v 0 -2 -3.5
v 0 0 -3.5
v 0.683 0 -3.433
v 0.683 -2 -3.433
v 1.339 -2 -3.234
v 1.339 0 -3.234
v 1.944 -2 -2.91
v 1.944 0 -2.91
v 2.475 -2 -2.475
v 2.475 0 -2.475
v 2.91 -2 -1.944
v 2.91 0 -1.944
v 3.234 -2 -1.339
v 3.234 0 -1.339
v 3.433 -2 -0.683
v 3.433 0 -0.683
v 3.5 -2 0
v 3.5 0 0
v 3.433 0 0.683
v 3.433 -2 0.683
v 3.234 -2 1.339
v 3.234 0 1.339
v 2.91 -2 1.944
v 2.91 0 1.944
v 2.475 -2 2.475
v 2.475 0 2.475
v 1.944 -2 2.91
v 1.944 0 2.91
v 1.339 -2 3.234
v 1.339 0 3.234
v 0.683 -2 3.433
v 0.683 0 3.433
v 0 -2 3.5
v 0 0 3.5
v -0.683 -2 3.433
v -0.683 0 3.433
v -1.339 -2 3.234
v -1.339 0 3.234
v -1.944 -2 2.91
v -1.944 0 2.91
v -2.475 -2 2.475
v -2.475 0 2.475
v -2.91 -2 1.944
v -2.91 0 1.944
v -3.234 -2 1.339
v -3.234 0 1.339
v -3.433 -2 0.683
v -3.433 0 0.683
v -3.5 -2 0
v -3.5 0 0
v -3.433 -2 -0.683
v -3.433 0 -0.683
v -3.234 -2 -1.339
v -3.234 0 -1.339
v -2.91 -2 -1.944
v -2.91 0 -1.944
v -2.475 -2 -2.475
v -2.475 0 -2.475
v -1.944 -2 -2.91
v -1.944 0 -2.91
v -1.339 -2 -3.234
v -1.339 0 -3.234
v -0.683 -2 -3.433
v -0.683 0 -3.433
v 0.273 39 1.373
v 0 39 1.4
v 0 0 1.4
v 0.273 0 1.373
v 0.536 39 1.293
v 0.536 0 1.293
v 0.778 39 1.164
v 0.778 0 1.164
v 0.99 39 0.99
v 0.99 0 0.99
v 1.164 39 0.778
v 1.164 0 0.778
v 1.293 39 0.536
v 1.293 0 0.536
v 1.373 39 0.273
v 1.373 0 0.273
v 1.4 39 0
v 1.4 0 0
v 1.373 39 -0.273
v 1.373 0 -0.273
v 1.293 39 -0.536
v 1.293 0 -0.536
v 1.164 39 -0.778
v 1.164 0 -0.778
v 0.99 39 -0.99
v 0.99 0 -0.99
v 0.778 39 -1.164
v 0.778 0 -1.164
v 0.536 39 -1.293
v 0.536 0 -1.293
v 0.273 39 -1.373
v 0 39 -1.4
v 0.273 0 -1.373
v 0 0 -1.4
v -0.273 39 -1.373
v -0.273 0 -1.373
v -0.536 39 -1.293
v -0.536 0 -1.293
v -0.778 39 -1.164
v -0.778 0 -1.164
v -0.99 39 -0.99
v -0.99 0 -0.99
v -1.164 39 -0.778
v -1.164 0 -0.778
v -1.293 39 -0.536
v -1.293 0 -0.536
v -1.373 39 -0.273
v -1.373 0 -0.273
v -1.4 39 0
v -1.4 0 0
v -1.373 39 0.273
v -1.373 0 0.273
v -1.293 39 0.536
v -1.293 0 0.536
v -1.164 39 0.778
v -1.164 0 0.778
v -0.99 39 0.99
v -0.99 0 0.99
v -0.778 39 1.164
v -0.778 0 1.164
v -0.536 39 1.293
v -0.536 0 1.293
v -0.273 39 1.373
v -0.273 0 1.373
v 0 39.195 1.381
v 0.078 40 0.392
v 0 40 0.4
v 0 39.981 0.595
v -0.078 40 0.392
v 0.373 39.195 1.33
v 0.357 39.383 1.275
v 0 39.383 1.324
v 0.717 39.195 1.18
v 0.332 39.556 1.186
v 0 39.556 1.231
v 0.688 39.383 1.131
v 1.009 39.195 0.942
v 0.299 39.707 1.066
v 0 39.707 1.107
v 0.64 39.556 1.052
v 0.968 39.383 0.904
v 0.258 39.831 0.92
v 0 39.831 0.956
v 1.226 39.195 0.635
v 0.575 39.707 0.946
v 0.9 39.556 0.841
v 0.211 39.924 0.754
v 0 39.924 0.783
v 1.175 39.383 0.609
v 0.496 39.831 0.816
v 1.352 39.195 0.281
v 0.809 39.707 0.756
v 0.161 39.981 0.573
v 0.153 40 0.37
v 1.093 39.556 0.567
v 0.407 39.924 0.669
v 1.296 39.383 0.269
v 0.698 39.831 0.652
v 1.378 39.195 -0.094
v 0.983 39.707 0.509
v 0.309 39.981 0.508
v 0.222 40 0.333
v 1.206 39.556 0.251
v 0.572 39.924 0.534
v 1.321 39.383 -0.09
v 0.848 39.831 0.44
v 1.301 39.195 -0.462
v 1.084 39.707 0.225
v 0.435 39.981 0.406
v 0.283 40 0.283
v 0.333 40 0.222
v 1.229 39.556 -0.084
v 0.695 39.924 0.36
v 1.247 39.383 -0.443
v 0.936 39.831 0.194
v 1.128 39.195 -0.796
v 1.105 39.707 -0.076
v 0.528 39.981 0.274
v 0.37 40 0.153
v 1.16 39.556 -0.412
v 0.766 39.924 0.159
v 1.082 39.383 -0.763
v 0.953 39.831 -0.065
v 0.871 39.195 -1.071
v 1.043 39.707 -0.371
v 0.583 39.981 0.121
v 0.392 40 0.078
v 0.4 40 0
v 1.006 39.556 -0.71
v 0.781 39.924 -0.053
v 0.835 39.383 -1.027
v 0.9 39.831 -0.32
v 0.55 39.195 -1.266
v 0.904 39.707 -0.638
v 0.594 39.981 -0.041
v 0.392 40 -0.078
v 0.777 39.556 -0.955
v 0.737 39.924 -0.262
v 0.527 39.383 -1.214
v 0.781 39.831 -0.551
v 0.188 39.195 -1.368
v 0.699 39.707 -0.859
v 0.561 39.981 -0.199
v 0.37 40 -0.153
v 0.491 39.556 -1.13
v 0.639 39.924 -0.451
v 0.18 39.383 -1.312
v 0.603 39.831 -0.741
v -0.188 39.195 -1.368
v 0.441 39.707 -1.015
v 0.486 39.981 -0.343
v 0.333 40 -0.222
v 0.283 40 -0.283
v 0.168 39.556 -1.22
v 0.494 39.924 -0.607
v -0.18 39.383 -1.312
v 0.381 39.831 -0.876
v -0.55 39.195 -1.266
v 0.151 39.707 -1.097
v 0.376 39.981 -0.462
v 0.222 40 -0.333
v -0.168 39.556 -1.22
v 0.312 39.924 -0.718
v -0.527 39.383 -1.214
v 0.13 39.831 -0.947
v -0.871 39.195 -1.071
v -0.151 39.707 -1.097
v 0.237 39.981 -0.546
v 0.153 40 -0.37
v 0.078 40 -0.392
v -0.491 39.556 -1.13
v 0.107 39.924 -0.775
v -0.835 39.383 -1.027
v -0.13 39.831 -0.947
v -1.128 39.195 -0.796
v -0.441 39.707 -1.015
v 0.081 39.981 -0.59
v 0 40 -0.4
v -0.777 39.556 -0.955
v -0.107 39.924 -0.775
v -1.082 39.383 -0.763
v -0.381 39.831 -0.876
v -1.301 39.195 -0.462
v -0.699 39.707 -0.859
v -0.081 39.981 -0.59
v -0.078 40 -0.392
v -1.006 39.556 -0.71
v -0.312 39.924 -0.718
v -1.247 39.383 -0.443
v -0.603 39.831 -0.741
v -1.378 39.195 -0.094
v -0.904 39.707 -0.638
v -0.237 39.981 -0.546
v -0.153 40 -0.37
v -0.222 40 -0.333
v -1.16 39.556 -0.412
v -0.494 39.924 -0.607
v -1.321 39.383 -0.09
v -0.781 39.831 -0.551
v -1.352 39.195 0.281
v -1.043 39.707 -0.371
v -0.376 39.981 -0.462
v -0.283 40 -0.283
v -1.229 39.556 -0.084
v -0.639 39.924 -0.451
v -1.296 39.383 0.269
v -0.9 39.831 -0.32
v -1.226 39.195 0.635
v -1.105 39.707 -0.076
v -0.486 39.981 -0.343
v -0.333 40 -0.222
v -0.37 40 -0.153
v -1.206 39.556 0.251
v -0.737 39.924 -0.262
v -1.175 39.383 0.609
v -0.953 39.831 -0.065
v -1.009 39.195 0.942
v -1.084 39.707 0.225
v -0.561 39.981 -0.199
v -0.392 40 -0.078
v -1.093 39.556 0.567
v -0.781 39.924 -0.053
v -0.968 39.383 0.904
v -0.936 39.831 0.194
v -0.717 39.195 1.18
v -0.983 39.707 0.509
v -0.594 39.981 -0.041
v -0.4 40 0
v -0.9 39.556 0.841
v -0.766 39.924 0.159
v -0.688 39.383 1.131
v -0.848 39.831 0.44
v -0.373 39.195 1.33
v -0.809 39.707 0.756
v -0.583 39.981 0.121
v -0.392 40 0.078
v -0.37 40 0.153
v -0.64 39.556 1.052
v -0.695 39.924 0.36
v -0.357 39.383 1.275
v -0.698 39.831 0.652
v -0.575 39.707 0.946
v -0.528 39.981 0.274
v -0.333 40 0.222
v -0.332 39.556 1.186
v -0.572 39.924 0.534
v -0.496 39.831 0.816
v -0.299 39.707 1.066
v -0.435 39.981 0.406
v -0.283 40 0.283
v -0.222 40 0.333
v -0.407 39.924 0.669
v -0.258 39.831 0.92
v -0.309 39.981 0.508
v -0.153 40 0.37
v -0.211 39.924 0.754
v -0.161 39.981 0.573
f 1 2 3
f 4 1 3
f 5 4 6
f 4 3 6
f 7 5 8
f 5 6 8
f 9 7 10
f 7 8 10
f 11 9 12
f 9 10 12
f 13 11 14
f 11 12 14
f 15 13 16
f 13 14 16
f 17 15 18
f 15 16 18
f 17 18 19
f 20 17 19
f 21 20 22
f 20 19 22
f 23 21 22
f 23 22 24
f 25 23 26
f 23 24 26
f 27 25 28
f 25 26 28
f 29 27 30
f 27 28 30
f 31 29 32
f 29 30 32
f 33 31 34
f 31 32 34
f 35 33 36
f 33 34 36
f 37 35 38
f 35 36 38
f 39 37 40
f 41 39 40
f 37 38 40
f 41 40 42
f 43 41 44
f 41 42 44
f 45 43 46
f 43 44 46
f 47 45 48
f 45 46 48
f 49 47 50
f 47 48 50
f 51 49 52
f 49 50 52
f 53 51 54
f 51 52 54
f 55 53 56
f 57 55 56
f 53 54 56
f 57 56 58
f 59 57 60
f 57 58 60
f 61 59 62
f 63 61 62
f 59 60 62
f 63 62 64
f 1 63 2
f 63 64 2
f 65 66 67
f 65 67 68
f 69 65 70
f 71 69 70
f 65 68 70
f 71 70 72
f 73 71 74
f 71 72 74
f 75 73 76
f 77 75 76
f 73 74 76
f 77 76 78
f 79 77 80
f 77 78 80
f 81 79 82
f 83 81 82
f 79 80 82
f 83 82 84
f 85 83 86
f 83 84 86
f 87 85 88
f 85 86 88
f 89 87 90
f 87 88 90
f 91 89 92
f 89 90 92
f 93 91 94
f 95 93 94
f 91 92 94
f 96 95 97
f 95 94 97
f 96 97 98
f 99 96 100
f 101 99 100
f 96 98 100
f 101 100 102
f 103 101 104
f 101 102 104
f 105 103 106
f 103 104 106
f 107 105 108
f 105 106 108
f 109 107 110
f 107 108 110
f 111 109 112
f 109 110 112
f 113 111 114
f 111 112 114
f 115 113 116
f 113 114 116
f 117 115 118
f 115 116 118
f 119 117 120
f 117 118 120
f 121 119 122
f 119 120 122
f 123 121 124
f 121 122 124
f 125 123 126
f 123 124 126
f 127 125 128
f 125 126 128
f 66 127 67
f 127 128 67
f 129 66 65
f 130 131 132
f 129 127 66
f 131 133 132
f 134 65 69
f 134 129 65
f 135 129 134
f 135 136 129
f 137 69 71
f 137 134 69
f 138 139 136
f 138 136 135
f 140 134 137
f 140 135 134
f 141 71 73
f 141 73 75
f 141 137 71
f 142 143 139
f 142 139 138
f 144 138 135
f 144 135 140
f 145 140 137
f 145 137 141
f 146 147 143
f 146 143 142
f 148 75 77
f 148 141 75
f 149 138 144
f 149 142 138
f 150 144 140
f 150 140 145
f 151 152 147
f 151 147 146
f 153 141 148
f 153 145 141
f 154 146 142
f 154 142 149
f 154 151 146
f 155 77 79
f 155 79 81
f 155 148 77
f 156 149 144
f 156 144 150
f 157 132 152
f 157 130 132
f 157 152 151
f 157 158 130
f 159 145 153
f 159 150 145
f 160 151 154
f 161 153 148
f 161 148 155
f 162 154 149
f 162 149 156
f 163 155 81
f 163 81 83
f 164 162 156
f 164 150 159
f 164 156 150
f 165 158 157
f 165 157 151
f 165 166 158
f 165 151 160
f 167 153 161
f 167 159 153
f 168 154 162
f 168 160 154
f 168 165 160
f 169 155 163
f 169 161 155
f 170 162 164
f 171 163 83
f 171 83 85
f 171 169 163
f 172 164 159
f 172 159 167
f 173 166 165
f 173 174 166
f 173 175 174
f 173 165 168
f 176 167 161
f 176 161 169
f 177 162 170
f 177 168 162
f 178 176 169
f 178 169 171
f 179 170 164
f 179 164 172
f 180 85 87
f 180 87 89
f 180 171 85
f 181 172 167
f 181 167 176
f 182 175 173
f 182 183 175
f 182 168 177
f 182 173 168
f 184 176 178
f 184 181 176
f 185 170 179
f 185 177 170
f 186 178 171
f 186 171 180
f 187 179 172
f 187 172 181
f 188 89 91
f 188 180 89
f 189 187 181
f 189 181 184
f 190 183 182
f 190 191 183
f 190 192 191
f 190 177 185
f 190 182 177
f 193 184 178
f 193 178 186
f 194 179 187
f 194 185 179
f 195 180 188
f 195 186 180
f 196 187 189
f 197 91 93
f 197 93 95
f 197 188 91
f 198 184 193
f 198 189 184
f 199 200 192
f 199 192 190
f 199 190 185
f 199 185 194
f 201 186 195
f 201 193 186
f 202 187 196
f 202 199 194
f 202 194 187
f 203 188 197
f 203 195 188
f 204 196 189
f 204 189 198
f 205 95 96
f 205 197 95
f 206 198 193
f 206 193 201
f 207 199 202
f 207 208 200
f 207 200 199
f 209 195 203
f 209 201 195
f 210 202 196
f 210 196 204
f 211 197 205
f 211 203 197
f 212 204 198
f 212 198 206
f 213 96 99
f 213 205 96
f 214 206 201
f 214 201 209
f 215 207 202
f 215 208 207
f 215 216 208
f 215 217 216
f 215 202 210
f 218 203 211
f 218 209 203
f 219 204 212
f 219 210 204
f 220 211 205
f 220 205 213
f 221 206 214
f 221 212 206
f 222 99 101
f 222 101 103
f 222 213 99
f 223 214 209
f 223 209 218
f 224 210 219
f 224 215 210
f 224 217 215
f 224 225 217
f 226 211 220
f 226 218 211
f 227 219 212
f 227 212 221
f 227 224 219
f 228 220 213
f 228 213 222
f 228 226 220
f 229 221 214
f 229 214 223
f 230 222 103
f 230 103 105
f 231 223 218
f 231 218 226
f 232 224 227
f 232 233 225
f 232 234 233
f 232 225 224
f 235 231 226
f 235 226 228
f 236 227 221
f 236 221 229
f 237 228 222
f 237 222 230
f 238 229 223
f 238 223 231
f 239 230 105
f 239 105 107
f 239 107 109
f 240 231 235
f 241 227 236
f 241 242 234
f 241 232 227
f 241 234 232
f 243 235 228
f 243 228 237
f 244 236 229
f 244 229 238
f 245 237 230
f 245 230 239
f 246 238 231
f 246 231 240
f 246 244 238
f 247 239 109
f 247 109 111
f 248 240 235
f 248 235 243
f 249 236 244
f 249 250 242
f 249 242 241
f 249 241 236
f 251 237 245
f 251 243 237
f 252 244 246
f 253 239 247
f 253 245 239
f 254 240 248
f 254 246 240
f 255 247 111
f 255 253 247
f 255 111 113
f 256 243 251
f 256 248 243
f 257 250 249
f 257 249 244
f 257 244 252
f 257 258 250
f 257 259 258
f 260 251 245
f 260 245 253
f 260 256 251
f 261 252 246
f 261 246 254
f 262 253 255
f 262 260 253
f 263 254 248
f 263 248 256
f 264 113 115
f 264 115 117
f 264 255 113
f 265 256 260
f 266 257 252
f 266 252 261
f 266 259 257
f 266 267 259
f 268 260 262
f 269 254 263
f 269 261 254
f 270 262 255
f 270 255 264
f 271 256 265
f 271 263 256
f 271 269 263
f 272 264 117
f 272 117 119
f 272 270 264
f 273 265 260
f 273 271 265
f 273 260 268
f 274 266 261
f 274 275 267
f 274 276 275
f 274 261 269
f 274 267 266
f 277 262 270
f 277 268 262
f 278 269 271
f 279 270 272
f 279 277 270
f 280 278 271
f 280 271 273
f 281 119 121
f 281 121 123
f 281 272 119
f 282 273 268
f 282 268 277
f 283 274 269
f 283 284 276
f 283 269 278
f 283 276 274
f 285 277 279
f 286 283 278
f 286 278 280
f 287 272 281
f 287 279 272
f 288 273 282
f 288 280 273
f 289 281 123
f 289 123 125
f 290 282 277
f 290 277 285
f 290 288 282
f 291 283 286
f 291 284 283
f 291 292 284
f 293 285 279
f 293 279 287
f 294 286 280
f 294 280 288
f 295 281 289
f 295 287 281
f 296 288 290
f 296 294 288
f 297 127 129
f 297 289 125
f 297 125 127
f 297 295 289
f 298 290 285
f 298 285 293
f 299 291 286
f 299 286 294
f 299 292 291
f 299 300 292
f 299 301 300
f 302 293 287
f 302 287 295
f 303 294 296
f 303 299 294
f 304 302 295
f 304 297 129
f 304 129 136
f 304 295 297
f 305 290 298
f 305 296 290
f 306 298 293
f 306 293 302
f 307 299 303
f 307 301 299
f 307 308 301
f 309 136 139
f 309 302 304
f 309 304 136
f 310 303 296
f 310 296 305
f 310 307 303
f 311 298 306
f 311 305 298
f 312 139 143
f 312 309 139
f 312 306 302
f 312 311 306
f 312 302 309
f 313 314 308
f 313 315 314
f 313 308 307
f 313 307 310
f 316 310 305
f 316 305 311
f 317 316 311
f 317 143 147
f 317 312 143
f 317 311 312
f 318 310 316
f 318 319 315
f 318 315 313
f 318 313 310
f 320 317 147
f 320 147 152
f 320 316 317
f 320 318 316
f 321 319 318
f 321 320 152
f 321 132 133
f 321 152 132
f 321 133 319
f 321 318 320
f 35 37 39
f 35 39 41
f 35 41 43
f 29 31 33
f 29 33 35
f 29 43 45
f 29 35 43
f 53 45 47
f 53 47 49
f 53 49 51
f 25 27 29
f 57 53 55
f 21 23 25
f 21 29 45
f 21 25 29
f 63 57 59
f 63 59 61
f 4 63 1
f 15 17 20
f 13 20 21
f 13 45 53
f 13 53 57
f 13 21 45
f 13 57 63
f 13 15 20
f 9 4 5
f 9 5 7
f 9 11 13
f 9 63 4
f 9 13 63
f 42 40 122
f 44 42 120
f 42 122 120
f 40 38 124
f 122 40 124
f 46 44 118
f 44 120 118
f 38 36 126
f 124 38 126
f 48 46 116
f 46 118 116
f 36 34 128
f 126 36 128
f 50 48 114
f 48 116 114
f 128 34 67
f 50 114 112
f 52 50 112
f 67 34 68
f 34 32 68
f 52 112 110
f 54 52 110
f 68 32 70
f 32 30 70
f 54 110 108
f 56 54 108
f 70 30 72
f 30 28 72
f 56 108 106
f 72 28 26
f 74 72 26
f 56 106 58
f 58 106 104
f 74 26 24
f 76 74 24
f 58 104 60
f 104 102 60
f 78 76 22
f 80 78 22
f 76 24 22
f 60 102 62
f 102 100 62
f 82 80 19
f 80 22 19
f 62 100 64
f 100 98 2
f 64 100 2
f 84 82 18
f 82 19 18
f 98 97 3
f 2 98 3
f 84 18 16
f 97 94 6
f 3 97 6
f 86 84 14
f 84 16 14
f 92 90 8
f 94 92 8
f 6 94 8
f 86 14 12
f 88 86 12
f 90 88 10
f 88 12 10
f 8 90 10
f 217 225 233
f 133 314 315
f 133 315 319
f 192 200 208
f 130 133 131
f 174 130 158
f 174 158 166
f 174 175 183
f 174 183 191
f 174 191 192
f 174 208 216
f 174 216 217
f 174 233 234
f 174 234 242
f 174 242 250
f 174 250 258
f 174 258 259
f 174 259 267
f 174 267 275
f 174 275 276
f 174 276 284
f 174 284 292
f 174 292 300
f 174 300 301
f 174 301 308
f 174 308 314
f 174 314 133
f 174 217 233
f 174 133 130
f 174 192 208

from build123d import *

# Parameters (mm, degrees)
SKETCH1_R           = 1.4
BOSS_EXTRUDE1_DEPTH = 40
SKETCH2_R           = 3.5
BOSS_EXTRUDE2_DEPTH = 2
FILLET2_R           = 1


with BuildPart() as part:
    # Sketch1 → Boss-Extrude1 (new body)
    with BuildSketch(Plane(origin=(0, 0, 0), x_dir=(1, 0, 0), z_dir=(0, 1, 0))):
        with Locations(Location((0, 0, 0), (0, 0, 270))):
            Circle(SKETCH1_R)
    extrude(amount=BOSS_EXTRUDE1_DEPTH)

    # Sketch2 → Boss-Extrude2 (add)
    with BuildSketch(Plane.XZ):
        with Locations(Location((0, 0, 0), (0, 0, 270))):
            Circle(SKETCH2_R)
    extrude(amount=BOSS_EXTRUDE2_DEPTH)

    # Fillet2
    fillet2_edges = [part.edges().sort_by_distance(p)[0] for p in [
        (0, 40, -1.4),
    ]]
    fillet(fillet2_edges, radius=FILLET2_R)


solid = part.part
